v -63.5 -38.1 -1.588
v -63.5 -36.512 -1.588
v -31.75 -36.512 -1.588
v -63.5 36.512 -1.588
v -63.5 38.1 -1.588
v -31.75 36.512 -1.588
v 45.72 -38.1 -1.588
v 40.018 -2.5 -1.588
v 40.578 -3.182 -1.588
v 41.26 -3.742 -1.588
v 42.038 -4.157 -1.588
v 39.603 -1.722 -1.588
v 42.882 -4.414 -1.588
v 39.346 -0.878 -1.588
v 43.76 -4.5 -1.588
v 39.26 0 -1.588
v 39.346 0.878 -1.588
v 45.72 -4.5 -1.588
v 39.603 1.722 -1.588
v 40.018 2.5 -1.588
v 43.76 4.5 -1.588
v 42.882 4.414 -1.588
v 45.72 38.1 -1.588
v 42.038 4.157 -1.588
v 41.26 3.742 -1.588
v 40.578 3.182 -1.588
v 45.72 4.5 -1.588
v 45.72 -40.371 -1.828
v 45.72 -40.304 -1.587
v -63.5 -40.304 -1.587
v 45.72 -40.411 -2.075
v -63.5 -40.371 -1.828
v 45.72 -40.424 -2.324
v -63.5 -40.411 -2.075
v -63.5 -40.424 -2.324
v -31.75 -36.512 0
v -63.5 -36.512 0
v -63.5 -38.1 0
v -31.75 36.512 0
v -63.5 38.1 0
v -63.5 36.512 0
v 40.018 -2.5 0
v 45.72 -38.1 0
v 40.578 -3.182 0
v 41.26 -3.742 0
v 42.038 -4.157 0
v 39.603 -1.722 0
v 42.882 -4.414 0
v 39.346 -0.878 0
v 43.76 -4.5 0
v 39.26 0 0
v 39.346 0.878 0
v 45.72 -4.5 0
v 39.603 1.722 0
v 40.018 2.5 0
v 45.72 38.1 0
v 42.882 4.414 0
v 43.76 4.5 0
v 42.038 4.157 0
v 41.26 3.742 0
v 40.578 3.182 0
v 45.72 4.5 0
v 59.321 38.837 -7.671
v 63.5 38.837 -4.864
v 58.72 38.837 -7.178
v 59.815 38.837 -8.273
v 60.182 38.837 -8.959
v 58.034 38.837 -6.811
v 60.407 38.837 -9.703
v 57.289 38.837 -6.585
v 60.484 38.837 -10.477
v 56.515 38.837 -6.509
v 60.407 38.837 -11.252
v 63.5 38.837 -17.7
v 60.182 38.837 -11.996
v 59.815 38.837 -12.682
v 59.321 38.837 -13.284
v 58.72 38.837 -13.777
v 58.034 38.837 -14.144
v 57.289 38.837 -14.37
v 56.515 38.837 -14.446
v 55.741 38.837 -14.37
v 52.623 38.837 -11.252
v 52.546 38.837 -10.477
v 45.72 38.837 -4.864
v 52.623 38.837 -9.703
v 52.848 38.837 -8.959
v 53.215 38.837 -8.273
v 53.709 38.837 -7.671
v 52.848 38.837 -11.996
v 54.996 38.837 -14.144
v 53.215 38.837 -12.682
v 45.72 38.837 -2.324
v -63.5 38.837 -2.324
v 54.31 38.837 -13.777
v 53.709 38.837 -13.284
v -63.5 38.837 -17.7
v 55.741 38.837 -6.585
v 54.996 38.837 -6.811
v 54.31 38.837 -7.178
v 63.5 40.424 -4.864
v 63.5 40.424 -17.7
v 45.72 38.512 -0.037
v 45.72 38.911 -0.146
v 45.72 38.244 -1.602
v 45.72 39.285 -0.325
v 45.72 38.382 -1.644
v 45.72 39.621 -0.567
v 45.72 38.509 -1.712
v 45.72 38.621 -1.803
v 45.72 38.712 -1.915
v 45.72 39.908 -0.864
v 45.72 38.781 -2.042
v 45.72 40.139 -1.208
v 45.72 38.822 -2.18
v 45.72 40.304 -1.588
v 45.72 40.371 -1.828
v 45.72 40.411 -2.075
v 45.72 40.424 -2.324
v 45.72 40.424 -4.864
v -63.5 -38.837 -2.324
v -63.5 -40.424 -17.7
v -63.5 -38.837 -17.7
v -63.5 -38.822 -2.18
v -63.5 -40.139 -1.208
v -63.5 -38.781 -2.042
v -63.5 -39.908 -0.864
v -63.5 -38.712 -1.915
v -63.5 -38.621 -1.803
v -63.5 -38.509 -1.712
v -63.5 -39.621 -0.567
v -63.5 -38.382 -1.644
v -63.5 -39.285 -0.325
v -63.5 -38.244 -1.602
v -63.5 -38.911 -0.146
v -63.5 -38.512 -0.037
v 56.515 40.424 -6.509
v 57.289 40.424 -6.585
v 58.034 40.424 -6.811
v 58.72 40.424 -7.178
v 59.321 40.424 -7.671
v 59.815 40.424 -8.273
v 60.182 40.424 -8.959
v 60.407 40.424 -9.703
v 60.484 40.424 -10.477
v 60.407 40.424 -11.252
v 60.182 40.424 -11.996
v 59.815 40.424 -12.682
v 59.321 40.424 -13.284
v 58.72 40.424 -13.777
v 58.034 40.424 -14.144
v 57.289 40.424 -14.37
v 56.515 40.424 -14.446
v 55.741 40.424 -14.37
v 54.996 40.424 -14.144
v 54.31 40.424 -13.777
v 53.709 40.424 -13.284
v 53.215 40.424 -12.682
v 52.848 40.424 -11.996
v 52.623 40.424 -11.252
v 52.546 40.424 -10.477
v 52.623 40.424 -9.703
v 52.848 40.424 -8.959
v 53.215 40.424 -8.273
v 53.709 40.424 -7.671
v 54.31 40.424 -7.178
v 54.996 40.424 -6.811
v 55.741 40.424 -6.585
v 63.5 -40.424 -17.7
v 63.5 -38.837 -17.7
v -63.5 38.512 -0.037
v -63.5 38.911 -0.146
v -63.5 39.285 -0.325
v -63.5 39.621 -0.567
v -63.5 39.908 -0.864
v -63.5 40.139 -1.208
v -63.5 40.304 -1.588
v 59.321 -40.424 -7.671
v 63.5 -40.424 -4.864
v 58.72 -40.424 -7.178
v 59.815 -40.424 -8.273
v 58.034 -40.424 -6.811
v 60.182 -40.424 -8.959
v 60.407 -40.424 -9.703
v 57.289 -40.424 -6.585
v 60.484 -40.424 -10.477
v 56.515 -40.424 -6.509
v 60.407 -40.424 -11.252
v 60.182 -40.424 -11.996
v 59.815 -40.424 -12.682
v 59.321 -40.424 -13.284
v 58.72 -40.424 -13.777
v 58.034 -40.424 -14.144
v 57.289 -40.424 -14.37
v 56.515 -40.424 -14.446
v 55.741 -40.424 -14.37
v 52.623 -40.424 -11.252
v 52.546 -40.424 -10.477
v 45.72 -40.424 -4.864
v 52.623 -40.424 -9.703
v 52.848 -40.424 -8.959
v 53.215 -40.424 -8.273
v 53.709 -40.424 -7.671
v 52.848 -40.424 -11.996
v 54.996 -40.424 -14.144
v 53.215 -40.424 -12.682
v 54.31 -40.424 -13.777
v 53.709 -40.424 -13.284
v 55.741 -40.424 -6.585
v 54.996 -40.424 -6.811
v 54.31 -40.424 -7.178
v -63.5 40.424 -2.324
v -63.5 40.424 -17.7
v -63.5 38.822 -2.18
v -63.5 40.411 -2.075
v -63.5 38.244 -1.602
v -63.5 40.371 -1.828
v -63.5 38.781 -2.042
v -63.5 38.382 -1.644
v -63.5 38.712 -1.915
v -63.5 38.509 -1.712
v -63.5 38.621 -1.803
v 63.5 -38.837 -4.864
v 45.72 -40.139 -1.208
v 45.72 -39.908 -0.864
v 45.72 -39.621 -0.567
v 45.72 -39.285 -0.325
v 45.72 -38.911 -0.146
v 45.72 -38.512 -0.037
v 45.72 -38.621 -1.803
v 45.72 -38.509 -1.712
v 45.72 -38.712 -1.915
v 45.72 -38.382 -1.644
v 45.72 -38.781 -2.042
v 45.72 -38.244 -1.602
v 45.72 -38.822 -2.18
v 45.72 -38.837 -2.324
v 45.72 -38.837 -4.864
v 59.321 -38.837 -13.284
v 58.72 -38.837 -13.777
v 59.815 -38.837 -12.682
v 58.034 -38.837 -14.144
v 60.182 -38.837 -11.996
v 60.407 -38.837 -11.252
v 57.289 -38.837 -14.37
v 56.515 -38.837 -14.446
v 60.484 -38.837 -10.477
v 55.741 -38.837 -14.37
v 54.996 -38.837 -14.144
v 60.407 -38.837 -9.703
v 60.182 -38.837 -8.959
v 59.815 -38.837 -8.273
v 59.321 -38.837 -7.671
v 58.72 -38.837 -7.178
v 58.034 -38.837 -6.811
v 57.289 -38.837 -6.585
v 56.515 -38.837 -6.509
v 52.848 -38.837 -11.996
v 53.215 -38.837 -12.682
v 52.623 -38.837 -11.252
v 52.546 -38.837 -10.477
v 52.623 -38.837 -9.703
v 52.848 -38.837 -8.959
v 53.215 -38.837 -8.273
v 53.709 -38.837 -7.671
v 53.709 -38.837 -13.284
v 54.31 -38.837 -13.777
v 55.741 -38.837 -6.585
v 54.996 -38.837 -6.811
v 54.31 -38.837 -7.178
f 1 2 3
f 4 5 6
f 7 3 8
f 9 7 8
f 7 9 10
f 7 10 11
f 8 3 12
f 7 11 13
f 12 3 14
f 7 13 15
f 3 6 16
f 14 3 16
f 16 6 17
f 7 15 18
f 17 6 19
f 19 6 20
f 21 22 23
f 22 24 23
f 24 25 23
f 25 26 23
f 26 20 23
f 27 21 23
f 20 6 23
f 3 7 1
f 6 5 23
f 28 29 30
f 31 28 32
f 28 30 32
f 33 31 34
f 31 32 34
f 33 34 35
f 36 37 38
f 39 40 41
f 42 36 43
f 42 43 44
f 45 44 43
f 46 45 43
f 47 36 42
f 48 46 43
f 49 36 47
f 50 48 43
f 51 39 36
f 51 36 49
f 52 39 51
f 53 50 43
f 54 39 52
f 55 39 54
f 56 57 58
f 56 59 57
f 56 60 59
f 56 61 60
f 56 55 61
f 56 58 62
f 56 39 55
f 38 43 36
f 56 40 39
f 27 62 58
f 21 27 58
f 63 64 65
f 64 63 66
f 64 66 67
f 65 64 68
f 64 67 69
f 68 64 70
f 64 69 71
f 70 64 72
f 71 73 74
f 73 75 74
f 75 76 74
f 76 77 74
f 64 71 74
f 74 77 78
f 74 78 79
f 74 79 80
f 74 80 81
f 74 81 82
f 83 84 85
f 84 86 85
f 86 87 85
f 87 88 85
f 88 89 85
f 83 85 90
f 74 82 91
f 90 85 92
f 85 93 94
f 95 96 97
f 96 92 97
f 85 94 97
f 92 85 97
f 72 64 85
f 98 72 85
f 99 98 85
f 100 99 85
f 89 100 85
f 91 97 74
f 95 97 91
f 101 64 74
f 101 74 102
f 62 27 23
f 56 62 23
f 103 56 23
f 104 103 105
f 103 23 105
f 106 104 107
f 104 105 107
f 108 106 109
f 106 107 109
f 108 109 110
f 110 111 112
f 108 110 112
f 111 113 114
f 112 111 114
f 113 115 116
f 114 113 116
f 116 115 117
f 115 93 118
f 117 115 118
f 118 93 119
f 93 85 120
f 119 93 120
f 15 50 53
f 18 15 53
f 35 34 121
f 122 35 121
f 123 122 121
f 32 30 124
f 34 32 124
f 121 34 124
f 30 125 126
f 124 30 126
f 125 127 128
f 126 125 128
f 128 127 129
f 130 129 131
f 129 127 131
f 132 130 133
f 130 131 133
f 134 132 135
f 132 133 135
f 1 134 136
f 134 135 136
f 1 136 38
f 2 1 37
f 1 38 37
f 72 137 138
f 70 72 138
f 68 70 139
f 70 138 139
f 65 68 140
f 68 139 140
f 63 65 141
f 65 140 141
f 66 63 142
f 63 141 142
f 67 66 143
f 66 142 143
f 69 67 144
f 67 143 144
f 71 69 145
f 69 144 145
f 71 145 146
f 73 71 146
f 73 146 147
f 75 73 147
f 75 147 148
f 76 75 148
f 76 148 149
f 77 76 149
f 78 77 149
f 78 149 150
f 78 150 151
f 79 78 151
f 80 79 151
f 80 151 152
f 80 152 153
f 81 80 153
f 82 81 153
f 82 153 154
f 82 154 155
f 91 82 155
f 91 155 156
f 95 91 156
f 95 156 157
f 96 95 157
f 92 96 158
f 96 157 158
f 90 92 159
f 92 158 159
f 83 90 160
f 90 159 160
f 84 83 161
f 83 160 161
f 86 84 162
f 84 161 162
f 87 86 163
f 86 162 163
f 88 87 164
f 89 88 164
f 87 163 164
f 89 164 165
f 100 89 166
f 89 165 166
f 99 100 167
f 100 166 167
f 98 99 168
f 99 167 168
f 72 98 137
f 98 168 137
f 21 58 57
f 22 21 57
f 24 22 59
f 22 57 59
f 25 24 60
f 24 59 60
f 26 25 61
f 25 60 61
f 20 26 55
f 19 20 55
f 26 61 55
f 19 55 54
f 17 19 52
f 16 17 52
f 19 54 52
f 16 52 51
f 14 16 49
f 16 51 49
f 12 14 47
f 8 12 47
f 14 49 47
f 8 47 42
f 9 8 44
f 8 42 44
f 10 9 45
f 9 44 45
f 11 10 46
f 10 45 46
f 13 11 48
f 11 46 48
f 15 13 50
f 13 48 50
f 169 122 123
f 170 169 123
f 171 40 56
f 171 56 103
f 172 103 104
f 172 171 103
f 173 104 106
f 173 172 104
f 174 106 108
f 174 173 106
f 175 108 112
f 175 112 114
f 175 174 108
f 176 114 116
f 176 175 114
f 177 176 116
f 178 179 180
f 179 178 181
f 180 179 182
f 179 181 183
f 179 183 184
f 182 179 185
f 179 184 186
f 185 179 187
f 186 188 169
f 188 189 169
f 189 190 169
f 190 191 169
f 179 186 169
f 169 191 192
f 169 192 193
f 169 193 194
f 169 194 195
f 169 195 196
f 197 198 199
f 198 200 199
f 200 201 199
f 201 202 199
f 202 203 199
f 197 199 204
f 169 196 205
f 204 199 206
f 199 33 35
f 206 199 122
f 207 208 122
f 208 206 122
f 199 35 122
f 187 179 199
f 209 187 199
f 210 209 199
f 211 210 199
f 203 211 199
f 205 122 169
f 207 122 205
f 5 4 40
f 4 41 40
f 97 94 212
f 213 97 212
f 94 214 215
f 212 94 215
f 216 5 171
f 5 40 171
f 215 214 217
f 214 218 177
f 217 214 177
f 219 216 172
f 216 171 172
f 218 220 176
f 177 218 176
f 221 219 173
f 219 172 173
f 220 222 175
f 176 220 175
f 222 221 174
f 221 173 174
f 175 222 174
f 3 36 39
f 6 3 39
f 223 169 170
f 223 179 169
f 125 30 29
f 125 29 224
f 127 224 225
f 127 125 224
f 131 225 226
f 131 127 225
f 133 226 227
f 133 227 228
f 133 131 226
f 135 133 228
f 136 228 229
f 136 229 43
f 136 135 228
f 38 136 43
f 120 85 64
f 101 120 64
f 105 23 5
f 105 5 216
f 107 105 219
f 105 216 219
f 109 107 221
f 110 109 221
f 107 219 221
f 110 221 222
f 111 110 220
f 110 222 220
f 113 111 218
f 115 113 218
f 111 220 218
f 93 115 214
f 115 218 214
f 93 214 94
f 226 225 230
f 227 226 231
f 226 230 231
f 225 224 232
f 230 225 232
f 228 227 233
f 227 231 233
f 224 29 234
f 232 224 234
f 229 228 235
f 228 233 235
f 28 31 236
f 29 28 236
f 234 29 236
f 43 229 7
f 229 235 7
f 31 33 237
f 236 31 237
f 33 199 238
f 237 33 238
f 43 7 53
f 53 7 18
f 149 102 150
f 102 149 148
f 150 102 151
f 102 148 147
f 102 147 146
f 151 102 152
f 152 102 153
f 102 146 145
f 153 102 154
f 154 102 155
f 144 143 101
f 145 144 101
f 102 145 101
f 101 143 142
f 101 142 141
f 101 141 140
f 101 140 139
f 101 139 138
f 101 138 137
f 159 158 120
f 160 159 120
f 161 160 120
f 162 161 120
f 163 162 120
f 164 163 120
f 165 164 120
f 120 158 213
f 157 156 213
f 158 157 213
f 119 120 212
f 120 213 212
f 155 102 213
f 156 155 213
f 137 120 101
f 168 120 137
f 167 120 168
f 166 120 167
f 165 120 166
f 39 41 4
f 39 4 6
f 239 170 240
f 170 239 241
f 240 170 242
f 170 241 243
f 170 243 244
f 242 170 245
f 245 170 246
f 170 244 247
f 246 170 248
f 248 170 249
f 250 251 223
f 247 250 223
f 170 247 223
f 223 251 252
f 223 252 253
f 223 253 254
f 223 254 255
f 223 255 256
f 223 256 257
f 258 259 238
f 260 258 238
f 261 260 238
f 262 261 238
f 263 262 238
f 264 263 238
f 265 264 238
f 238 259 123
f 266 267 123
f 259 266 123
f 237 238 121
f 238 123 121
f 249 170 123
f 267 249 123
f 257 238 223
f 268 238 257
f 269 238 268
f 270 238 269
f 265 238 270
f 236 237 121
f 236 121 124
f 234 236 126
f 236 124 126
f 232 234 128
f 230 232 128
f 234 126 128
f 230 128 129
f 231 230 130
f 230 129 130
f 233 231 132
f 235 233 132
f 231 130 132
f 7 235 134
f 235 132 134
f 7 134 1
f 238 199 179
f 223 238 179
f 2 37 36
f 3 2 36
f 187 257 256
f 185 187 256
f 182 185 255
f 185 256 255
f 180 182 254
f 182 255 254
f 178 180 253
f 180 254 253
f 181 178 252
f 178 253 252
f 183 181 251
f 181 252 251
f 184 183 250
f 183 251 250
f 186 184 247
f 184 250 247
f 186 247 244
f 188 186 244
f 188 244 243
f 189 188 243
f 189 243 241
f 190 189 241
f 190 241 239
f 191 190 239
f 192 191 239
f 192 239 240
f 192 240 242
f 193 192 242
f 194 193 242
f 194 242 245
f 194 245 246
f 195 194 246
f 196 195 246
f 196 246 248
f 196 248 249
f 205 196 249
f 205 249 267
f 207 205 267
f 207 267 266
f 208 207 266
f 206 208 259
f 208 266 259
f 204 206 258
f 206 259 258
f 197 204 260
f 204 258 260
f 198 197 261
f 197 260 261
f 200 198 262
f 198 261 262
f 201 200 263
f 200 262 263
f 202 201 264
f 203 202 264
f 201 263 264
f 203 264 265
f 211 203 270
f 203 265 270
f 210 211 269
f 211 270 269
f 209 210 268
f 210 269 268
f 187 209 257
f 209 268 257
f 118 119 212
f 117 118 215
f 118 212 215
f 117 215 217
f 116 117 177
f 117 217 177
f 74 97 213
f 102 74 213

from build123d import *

# Parameters (mm, degrees)
SKETCH1_W              = 127
SKETCH1_H              = 111.76
BASE_FLANGE1_DEPTH     = 1.5875
SKETCHED_START         = -63.5
SKETCHED_BEND1_DEPTH   = 127
SKETCHED_BEND1_2_DEPTH = 127
CUT_EXTRUDE2_START     = -2.3241
CUT_EXTRUDE2_OUTLINE_W = 17.78
CUT_EXTRUDE2_OUTLINE_H = 84
CUT_EXTRUDE2_DEPTH     = 2.3241
CUT_EXTRUDE1_REACH     = 106.317
SKETCH6_R              = 3.96875
CUT_EXTRUDE3_DEPTH     = 78.328235904
SKETCH34_W             = 31.75
SKETCH34_H             = 73.025
CUT_EXTRUDE5_DEPTH     = 2.54
CUT_EXTRUDE6_REACH     = 106.317
SKETCH49_W             = 17.78
SKETCH49_H             = 2.54


# Read off the part's stored shape, not the designer's step: Sketched Bend1, Cut-Extrude2
# Sheet-metal steps are written as plain solids
with BuildPart() as part:
    # Sketch1 → Base-Flange1 (new body)
    with BuildSketch(Plane.XY):
        Rectangle(SKETCH1_W, SKETCH1_H)
    extrude(amount=-BASE_FLANGE1_DEPTH)

    # Sketched Bend1 outline → Sketched Bend1 (cut)
    with BuildSketch(Plane.YZ.offset(SKETCHED_START)):
        with BuildLine():
            ThreePointArc((38.1, 0), (39.458217352, -0.438182071), (40.304282479, -1.5875))
            Line((40.304282479, -1.5875), (55.88, -1.5875))
            Line((55.88, -1.5875), (55.88, 0))
            Line((55.88, 0), (38.1, 0))
        make_face()
        with BuildLine():
            Line((-55.88, -1.5875), (-40.304282479, -1.5875))
            ThreePointArc((-40.304282479, -1.5875), (-39.458217352, -0.438182071), (-38.1, 0))
            Line((-38.1, 0), (-55.88, 0))
            Line((-55.88, 0), (-55.88, -1.5875))
        make_face()
    extrude(amount=SKETCHED_BEND1_DEPTH, mode=Mode.SUBTRACT)

    # Sketched Bend1 2 outline → Sketched Bend1 2 (add)
    with BuildSketch(Plane.YZ.offset(SKETCHED_START)):
        with BuildLine():
            ThreePointArc((38.1, -1.5875), (38.620854855, -1.803245145), (38.8366, -2.3241))
            Line((38.8366, -2.3241), (38.8366, -17.700231841))
            Line((38.8366, -17.700231841), (40.4241, -17.700231841))
            Line((40.4241, -17.700231841), (40.4241, -2.3241))
            ThreePointArc((40.4241, -2.3241), (40.393950056, -1.950959343), (40.304282479, -1.5875))
            Line((40.304282479, -1.5875), (38.1, -1.5875))
        make_face()
        with BuildLine():
            ThreePointArc((-38.8366, -2.3241), (-38.620854855, -1.803245145), (-38.1, -1.5875))
            Line((-38.1, -1.5875), (-40.304282479, -1.5875))
            ThreePointArc((-40.304282479, -1.5875), (-40.393950056, -1.950959343), (-40.4241, -2.3241))
            Line((-40.4241, -2.3241), (-40.4241, -17.700231841))
            Line((-40.4241, -17.700231841), (-38.8366, -17.700231841))
            Line((-38.8366, -17.700231841), (-38.8366, -2.3241))
        make_face()
    extrude(amount=SKETCHED_BEND1_2_DEPTH)

    # Cut-Extrude2 outline → Cut-Extrude2 (cut)
    with BuildSketch(Plane.XY.offset(CUT_EXTRUDE2_START)):
        with Locations((54.61, 0)):
            Rectangle(CUT_EXTRUDE2_OUTLINE_W, CUT_EXTRUDE2_OUTLINE_H)
    extrude(amount=CUT_EXTRUDE2_DEPTH, mode=Mode.SUBTRACT)

    # Cut-Extrude1: up to this face of the body (flat: up to its plane)
    cut_extrude1_end = Plane(part.part.faces().sort_by_distance((0, -40.4241, -10.012165921))[0])
    # Sketch6 → Cut-Extrude1 (cut, up to the picked face)
    with BuildSketch(Plane(origin=(0, 40.4241, 0), x_dir=(1, 0, 0), z_dir=(0, 1, 0)), mode=Mode.PRIVATE) as cut_extrude1_sk1:
        with Locations(Location((56.515, 10.4775, 0), (0, 0, 270))):
            Circle(SKETCH6_R)
    cut_extrude1_tool1 = split(extrude(cut_extrude1_sk1.sketch, amount=-CUT_EXTRUDE1_REACH, mode=Mode.PRIVATE), bisect_by=cut_extrude1_end, keep=Keep.BOTH, mode=Mode.PRIVATE)
    add(cut_extrude1_tool1.solids().sort_by(Axis((56.515, 40.4241, -10.4775), (0, -1, 0)))[0], mode=Mode.SUBTRACT)

    # Sketch13 → Cut-Extrude3 (cut, through all)
    with BuildSketch(Plane.XY):
        with BuildLine():
            ThreePointArc((45.72, 4.050728383), (44.765416013, 4.386244277), (43.76000011, 4.5))
            ThreePointArc((43.76000011, 4.5), (39.26000011, 0), (43.76000011, -4.5))
            ThreePointArc((43.76000011, -4.5), (44.765416013, -4.386244277), (45.72, -4.050728383))
            Line((45.72, -4.050728383), (45.72, 4.050728383))
        make_face()
        with BuildLine():
            ThreePointArc((48.26000011, 0), (47.572479586, 2.390606669), (45.72, 4.050728383))
            Line((45.72, 4.050728383), (45.72, -4.050728383))
            ThreePointArc((45.72, -4.050728383), (47.572479586, -2.390606669), (48.26000011, 0))
        make_face()
        with BuildLine():
            Line((45.72, 4.5), (43.76000011, 4.5))
            ThreePointArc((43.76000011, 4.5), (44.765416013, 4.386244277), (45.72, 4.050728383))
            Line((45.72, 4.050728383), (45.72, 4.5))
        make_face()
        with BuildLine():
            ThreePointArc((45.72, -4.050728383), (44.765416013, -4.386244277), (43.76000011, -4.5))
            Line((43.76000011, -4.5), (45.72, -4.5))
            Line((45.72, -4.5), (45.72, -4.050728383))
        make_face()
    extrude(amount=-CUT_EXTRUDE3_DEPTH, mode=Mode.SUBTRACT)

    # Sketch34 → Cut-Extrude5 (cut)
    with BuildSketch(Plane.XY):
        with Locations((-47.625, 0)):
            Rectangle(SKETCH34_W, SKETCH34_H)
    extrude(amount=-CUT_EXTRUDE5_DEPTH, mode=Mode.SUBTRACT)

    # Cut-Extrude6: up to this face of the body (flat: up to its plane)
    cut_extrude6_end = Plane(part.part.faces().sort_by_distance((-1.469322503, 40.4241, -10.00006779))[0])
    # Sketch49 → Cut-Extrude6 (cut, up to the picked face)
    with BuildSketch(Plane.XZ.offset(40.4241), mode=Mode.PRIVATE) as cut_extrude6_sk1:
        with Locations((54.61, -3.5941)):
            Rectangle(SKETCH49_W, SKETCH49_H)
    cut_extrude6_tool1 = split(extrude(cut_extrude6_sk1.sketch, amount=-CUT_EXTRUDE6_REACH, mode=Mode.PRIVATE), bisect_by=cut_extrude6_end, keep=Keep.BOTH, mode=Mode.PRIVATE)
    add(cut_extrude6_tool1.solids().sort_by(Axis((54.61, -40.4241, -3.5941), (0, 1, 0)))[0], mode=Mode.SUBTRACT)


solid = part.part
